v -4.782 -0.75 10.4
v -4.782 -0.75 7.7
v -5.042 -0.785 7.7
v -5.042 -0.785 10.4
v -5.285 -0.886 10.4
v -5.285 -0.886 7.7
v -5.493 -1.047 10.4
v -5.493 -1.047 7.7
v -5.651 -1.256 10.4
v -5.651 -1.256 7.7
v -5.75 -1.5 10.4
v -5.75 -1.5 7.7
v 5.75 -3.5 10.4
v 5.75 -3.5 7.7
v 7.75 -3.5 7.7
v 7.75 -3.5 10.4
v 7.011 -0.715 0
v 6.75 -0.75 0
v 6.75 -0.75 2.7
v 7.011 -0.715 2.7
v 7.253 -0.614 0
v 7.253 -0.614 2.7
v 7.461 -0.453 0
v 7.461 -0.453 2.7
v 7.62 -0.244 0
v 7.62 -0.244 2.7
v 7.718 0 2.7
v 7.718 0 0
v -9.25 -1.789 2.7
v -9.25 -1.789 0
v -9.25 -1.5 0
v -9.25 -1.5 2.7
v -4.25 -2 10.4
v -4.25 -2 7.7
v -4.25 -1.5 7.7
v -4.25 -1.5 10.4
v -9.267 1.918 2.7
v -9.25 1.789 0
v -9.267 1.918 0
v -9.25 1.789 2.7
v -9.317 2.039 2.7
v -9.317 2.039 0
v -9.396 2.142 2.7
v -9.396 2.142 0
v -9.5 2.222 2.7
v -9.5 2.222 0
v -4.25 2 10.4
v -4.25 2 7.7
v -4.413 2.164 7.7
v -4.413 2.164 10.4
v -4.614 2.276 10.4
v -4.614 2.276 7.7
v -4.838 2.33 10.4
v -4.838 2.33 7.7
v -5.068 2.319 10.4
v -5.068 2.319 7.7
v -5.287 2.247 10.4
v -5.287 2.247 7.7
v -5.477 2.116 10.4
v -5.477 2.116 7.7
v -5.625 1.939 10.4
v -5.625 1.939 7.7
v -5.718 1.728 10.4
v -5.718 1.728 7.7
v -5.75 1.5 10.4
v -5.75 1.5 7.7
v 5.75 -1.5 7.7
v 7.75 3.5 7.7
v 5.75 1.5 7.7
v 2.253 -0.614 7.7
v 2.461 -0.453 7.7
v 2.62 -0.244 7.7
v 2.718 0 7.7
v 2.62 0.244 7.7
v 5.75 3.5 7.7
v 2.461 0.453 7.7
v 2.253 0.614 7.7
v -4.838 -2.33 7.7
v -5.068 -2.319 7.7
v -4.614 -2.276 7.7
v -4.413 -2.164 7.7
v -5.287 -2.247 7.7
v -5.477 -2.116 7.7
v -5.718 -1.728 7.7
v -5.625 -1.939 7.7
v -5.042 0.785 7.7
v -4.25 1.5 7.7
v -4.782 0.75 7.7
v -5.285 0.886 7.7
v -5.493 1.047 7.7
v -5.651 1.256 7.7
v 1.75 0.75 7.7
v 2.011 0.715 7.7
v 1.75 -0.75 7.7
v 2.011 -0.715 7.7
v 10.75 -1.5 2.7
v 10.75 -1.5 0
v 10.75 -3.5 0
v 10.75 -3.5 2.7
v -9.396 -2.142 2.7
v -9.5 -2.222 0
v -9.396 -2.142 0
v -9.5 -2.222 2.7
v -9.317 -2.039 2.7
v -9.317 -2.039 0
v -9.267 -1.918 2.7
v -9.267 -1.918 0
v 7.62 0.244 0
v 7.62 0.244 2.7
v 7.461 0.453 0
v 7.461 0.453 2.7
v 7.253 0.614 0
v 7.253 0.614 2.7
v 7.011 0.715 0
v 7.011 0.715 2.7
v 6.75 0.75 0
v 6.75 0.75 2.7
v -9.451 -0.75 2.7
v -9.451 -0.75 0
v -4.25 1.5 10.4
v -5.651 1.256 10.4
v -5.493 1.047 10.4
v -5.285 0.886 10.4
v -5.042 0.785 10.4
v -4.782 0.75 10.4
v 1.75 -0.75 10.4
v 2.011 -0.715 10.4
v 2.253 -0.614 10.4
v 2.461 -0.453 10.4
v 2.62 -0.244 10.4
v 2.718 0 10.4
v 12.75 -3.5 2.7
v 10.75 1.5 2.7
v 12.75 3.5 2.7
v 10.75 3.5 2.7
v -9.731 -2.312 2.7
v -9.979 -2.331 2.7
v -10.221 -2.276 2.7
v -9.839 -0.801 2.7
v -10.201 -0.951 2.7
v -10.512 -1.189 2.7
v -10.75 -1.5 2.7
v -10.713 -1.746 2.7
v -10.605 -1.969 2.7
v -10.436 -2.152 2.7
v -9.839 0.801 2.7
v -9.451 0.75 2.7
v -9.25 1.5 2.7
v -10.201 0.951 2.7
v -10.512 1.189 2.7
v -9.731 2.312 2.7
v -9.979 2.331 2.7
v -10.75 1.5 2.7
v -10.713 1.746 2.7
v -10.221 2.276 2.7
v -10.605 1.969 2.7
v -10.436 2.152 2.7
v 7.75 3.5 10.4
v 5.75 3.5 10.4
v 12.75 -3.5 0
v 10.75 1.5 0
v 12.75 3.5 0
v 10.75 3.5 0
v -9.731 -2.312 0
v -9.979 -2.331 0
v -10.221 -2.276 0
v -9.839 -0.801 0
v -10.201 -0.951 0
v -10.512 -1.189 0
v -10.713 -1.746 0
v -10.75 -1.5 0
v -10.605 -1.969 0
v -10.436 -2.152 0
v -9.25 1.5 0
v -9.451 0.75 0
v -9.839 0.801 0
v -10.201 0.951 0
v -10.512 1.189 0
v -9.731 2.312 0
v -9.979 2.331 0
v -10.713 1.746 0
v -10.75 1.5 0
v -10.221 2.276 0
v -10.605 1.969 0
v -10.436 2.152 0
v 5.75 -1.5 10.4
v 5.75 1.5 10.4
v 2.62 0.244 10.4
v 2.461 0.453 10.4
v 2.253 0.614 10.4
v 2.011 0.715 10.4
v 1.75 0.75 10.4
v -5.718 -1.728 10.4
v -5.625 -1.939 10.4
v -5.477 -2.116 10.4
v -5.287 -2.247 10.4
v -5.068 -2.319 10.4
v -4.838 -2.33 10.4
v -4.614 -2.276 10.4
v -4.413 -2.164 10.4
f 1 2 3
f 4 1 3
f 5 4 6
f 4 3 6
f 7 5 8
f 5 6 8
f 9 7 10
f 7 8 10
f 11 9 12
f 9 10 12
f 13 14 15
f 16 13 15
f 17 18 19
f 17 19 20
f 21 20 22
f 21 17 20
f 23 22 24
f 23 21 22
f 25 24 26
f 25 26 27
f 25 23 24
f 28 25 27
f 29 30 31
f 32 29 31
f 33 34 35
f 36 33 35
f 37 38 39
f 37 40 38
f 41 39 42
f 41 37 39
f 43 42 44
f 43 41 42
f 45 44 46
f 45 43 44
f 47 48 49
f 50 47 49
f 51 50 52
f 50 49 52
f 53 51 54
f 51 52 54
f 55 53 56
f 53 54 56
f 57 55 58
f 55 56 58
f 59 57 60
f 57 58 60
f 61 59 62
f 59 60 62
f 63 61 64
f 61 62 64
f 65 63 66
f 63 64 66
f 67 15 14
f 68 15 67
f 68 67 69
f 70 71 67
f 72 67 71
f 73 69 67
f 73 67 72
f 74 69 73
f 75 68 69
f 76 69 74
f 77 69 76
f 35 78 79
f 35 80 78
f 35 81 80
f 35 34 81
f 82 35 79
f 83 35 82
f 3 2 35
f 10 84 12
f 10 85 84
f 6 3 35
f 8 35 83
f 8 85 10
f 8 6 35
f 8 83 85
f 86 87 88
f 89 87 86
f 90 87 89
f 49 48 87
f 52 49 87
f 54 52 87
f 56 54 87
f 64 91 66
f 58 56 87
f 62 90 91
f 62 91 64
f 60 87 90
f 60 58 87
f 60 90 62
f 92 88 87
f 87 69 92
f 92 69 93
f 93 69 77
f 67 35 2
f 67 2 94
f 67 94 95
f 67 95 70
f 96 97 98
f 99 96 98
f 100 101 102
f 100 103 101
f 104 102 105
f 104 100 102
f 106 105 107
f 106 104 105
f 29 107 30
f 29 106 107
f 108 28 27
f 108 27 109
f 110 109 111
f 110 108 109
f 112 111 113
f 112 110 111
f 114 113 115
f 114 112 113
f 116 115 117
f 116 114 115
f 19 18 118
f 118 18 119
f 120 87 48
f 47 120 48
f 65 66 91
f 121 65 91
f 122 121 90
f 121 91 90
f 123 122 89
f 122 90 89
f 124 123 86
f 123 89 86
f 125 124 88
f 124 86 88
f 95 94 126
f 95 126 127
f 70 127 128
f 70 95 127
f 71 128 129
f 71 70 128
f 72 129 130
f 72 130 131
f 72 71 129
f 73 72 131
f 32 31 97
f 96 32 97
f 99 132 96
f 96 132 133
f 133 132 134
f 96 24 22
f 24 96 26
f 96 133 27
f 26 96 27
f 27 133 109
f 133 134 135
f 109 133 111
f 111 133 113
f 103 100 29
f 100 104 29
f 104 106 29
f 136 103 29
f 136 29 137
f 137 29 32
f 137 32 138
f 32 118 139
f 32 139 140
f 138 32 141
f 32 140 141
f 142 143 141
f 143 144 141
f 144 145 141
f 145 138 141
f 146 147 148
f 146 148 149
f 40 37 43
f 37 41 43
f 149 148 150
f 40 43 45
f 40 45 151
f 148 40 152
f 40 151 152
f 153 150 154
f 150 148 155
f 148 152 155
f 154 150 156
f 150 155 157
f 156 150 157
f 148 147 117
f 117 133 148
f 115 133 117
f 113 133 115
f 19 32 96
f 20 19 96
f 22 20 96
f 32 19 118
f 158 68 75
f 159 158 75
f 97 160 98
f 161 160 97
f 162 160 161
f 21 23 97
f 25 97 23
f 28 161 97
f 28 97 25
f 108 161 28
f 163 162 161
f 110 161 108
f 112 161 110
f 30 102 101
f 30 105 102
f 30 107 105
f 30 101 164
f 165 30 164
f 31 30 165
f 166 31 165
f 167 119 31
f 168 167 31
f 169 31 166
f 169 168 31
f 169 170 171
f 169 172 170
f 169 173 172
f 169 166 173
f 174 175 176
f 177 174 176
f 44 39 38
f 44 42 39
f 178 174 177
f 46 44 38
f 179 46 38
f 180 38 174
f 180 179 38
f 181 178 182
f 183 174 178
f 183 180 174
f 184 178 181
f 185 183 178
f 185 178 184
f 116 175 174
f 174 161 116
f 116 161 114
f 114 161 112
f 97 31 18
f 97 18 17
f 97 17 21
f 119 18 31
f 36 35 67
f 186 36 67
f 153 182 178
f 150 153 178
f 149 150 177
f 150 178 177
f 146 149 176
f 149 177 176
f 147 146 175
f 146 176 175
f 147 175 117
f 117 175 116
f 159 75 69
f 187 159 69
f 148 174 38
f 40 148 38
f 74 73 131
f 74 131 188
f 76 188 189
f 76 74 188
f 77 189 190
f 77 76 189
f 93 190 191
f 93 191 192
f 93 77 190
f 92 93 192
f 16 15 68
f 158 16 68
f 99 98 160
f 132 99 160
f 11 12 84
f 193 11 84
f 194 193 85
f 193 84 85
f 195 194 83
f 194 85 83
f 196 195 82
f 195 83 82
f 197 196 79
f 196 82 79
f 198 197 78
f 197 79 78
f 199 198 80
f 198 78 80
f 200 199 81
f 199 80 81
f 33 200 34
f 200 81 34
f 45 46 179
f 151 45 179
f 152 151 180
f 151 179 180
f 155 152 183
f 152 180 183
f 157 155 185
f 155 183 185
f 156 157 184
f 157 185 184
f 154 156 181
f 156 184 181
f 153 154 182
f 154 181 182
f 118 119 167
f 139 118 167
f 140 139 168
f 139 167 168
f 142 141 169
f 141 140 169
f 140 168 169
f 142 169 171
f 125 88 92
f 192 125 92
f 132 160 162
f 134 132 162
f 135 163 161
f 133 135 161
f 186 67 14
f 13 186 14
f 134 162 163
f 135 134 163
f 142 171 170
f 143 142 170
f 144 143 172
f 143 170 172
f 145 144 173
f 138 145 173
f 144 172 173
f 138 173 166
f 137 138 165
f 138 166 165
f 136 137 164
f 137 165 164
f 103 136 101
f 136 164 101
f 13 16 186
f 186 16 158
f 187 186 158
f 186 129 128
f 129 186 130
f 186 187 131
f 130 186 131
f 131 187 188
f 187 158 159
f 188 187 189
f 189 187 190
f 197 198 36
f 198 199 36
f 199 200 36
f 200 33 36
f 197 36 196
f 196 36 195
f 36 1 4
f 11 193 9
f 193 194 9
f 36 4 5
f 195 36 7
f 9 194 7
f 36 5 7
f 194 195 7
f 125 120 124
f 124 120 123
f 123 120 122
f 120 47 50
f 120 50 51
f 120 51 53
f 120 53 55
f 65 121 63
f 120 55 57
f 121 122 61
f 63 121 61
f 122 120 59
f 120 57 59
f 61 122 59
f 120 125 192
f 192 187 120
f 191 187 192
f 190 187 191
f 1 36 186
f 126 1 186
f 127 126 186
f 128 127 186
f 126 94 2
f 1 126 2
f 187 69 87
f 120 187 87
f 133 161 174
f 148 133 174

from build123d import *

# Parameters (mm, degrees)
F1_DEPTH    = 2.7
F2_R        = 0.5
F3_T1_DEPTH = 9.1951905284
F4_T1_DEPTH = 2.7
F7_DEPTH    = 2.7
F8_T1_DEPTH = 7.5412291828
F9_T1_DEPTH = 2.7


# Not quite as in the source:
# - a fillet or chamfer that OpenCascade refuses, or shapes differently, is made with other operations: its cross-section is extruded or revolved along the edge and cut away or added


with BuildPart() as f1:
    # F0 (on Top) → F1 (new body)
    with BuildSketch(Plane.XY):
        Polygon((10.75, -1.5), (10.75, 1.5), (-9.25, 1.5), (-10.75, 1.5), (-10.75, 0.75), (7.75, 0.75), (7.75, -0.75), (-10.75, -0.75), (-10.75, -1.5), (-9.25, -1.5), align=None)
        Polygon((10.75, 3.5), (10.75, 1.5), (10.75, -1.5), (10.75, -3.5), (12.75, -3.5), (12.75, 3.5), align=None)
        with BuildLine():
            Line((-10.75, 1.5), (-9.25, 1.5))
            Line((-9.25, 1.5), (-9.25, 2))
            ThreePointArc((-9.25, 2), (-10.180189805, 2.290569415), (-10.75, 1.5))
        make_face()
        with BuildLine():
            Line((-9.25, -2), (-9.25, -1.5))
            Line((-9.25, -1.5), (-10.75, -1.5))
            ThreePointArc((-10.75, -1.5), (-10.180189805, -2.290569415), (-9.25, -2))
        make_face()
    extrude(amount=F1_DEPTH)

    # F2
    f2_edges = [f1.edges().sort_by_distance(p)[0] for p in [
        (-9.25, 2, 1.35),
        (-9.25, -2, 1.35),
    ]]
    fillet(f2_edges, radius=F2_R)

    # F3: fillet of radius 1.5 on 2 edges, made by hand

    # F3_s2 → F3_t1 (cut)
    with BuildSketch(Plane.XY.offset(-3.2475952642)):
        with BuildLine():
            ThreePointArc((-10.75, 1.5), (-10.2009618943, 0.9509618943), (-9.4509618943, 0.75))
            Line((-9.4509618943, 0.75), (-10.75, 0.75))
            Line((-10.75, 0.75), (-10.75, 1.5))
        make_face()
        with BuildLine():
            ThreePointArc((-9.4509618943, -0.75), (-10.2009618943, -0.9509618943), (-10.75, -1.5))
            Line((-10.75, -1.5), (-10.75, -0.75))
            Line((-10.75, -0.75), (-9.4509618943, -0.75))
        make_face()
    extrude(amount=F3_T1_DEPTH, mode=Mode.SUBTRACT)

    # F4: fillet of radius 1 on 2 edges, made by hand

    # F4_s2 → F4_t1 (join)
    with BuildSketch(Plane.XY):
        with BuildLine():
            ThreePointArc((7.75, -0.25), (7.4571067812, 0.4571067812), (6.75, 0.75))
            Line((6.75, 0.75), (7.75, 0.75))
            Line((7.75, 0.75), (7.75, -0.25))
        make_face()
        with BuildLine():
            ThreePointArc((6.75, -0.75), (7.4571067812, -0.4571067812), (7.75, 0.25))
            Line((7.75, 0.25), (7.75, -0.75))
            Line((7.75, -0.75), (6.75, -0.75))
        make_face()
    extrude(amount=F4_T1_DEPTH)


with BuildPart() as f7:
    # F6 (on offset) → F7 (new body)
    with BuildSketch(Plane.XY.offset(7.7)):
        Polygon((5.75, 3.5), (5.75, 1.5), (5.75, -1.5), (5.75, -3.5), (7.75, -3.5), (7.75, 3.5), align=None)
        Polygon((5.75, -1.5), (5.75, 1.5), (-4.25, 1.5), (-5.75, 1.5), (-5.75, 0.75), (2.75, 0.75), (2.75, -0.75), (-5.75, -0.75), (-5.75, -1.5), (-4.25, -1.5), align=None)
        with BuildLine():
            Line((-5.75, 1.5), (-4.25, 1.5))
            Line((-4.25, 1.5), (-4.25, 2))
            ThreePointArc((-4.25, 2), (-5.180189805, 2.290569415), (-5.75, 1.5))
        make_face()
        with BuildLine():
            Line((-4.25, -2), (-4.25, -1.5))
            Line((-4.25, -1.5), (-5.75, -1.5))
            ThreePointArc((-5.75, -1.5), (-5.180189805, -2.290569415), (-4.25, -2))
        make_face()
    extrude(amount=F7_DEPTH)

    # F8: fillet of radius 1 on 2 edges, made by hand

    # F8_s2 → F8_t1 (cut)
    with BuildSketch(Plane.XY.offset(5.2793854086)):
        with BuildLine():
            ThreePointArc((-5.75, 1.5), (-5.3941265991, 0.959430585), (-4.7817541634, 0.75))
            Line((-4.7817541634, 0.75), (-5.75, 0.75))
            Line((-5.75, 0.75), (-5.75, 1.5))
        make_face()
        with BuildLine():
            ThreePointArc((-4.7817541634, -0.75), (-5.3941265991, -0.959430585), (-5.75, -1.5))
            Line((-5.75, -1.5), (-5.75, -0.75))
            Line((-5.75, -0.75), (-4.7817541634, -0.75))
        make_face()
    extrude(amount=F8_T1_DEPTH, mode=Mode.SUBTRACT)

    # F9: fillet of radius 1 on 2 edges, made by hand

    # F9_s2 → F9_t1 (join)
    with BuildSketch(Plane.XY.offset(7.7)):
        with BuildLine():
            ThreePointArc((2.75, -0.25), (2.4571067812, 0.4571067812), (1.75, 0.75))
            Line((1.75, 0.75), (2.75, 0.75))
            Line((2.75, 0.75), (2.75, -0.25))
        make_face()
        with BuildLine():
            ThreePointArc((1.75, -0.75), (2.4571067812, -0.4571067812), (2.75, 0.25))
            Line((2.75, 0.25), (2.75, -0.75))
            Line((2.75, -0.75), (1.75, -0.75))
        make_face()
    extrude(amount=F9_T1_DEPTH)


solid = Compound([f1.part, f7.part])
